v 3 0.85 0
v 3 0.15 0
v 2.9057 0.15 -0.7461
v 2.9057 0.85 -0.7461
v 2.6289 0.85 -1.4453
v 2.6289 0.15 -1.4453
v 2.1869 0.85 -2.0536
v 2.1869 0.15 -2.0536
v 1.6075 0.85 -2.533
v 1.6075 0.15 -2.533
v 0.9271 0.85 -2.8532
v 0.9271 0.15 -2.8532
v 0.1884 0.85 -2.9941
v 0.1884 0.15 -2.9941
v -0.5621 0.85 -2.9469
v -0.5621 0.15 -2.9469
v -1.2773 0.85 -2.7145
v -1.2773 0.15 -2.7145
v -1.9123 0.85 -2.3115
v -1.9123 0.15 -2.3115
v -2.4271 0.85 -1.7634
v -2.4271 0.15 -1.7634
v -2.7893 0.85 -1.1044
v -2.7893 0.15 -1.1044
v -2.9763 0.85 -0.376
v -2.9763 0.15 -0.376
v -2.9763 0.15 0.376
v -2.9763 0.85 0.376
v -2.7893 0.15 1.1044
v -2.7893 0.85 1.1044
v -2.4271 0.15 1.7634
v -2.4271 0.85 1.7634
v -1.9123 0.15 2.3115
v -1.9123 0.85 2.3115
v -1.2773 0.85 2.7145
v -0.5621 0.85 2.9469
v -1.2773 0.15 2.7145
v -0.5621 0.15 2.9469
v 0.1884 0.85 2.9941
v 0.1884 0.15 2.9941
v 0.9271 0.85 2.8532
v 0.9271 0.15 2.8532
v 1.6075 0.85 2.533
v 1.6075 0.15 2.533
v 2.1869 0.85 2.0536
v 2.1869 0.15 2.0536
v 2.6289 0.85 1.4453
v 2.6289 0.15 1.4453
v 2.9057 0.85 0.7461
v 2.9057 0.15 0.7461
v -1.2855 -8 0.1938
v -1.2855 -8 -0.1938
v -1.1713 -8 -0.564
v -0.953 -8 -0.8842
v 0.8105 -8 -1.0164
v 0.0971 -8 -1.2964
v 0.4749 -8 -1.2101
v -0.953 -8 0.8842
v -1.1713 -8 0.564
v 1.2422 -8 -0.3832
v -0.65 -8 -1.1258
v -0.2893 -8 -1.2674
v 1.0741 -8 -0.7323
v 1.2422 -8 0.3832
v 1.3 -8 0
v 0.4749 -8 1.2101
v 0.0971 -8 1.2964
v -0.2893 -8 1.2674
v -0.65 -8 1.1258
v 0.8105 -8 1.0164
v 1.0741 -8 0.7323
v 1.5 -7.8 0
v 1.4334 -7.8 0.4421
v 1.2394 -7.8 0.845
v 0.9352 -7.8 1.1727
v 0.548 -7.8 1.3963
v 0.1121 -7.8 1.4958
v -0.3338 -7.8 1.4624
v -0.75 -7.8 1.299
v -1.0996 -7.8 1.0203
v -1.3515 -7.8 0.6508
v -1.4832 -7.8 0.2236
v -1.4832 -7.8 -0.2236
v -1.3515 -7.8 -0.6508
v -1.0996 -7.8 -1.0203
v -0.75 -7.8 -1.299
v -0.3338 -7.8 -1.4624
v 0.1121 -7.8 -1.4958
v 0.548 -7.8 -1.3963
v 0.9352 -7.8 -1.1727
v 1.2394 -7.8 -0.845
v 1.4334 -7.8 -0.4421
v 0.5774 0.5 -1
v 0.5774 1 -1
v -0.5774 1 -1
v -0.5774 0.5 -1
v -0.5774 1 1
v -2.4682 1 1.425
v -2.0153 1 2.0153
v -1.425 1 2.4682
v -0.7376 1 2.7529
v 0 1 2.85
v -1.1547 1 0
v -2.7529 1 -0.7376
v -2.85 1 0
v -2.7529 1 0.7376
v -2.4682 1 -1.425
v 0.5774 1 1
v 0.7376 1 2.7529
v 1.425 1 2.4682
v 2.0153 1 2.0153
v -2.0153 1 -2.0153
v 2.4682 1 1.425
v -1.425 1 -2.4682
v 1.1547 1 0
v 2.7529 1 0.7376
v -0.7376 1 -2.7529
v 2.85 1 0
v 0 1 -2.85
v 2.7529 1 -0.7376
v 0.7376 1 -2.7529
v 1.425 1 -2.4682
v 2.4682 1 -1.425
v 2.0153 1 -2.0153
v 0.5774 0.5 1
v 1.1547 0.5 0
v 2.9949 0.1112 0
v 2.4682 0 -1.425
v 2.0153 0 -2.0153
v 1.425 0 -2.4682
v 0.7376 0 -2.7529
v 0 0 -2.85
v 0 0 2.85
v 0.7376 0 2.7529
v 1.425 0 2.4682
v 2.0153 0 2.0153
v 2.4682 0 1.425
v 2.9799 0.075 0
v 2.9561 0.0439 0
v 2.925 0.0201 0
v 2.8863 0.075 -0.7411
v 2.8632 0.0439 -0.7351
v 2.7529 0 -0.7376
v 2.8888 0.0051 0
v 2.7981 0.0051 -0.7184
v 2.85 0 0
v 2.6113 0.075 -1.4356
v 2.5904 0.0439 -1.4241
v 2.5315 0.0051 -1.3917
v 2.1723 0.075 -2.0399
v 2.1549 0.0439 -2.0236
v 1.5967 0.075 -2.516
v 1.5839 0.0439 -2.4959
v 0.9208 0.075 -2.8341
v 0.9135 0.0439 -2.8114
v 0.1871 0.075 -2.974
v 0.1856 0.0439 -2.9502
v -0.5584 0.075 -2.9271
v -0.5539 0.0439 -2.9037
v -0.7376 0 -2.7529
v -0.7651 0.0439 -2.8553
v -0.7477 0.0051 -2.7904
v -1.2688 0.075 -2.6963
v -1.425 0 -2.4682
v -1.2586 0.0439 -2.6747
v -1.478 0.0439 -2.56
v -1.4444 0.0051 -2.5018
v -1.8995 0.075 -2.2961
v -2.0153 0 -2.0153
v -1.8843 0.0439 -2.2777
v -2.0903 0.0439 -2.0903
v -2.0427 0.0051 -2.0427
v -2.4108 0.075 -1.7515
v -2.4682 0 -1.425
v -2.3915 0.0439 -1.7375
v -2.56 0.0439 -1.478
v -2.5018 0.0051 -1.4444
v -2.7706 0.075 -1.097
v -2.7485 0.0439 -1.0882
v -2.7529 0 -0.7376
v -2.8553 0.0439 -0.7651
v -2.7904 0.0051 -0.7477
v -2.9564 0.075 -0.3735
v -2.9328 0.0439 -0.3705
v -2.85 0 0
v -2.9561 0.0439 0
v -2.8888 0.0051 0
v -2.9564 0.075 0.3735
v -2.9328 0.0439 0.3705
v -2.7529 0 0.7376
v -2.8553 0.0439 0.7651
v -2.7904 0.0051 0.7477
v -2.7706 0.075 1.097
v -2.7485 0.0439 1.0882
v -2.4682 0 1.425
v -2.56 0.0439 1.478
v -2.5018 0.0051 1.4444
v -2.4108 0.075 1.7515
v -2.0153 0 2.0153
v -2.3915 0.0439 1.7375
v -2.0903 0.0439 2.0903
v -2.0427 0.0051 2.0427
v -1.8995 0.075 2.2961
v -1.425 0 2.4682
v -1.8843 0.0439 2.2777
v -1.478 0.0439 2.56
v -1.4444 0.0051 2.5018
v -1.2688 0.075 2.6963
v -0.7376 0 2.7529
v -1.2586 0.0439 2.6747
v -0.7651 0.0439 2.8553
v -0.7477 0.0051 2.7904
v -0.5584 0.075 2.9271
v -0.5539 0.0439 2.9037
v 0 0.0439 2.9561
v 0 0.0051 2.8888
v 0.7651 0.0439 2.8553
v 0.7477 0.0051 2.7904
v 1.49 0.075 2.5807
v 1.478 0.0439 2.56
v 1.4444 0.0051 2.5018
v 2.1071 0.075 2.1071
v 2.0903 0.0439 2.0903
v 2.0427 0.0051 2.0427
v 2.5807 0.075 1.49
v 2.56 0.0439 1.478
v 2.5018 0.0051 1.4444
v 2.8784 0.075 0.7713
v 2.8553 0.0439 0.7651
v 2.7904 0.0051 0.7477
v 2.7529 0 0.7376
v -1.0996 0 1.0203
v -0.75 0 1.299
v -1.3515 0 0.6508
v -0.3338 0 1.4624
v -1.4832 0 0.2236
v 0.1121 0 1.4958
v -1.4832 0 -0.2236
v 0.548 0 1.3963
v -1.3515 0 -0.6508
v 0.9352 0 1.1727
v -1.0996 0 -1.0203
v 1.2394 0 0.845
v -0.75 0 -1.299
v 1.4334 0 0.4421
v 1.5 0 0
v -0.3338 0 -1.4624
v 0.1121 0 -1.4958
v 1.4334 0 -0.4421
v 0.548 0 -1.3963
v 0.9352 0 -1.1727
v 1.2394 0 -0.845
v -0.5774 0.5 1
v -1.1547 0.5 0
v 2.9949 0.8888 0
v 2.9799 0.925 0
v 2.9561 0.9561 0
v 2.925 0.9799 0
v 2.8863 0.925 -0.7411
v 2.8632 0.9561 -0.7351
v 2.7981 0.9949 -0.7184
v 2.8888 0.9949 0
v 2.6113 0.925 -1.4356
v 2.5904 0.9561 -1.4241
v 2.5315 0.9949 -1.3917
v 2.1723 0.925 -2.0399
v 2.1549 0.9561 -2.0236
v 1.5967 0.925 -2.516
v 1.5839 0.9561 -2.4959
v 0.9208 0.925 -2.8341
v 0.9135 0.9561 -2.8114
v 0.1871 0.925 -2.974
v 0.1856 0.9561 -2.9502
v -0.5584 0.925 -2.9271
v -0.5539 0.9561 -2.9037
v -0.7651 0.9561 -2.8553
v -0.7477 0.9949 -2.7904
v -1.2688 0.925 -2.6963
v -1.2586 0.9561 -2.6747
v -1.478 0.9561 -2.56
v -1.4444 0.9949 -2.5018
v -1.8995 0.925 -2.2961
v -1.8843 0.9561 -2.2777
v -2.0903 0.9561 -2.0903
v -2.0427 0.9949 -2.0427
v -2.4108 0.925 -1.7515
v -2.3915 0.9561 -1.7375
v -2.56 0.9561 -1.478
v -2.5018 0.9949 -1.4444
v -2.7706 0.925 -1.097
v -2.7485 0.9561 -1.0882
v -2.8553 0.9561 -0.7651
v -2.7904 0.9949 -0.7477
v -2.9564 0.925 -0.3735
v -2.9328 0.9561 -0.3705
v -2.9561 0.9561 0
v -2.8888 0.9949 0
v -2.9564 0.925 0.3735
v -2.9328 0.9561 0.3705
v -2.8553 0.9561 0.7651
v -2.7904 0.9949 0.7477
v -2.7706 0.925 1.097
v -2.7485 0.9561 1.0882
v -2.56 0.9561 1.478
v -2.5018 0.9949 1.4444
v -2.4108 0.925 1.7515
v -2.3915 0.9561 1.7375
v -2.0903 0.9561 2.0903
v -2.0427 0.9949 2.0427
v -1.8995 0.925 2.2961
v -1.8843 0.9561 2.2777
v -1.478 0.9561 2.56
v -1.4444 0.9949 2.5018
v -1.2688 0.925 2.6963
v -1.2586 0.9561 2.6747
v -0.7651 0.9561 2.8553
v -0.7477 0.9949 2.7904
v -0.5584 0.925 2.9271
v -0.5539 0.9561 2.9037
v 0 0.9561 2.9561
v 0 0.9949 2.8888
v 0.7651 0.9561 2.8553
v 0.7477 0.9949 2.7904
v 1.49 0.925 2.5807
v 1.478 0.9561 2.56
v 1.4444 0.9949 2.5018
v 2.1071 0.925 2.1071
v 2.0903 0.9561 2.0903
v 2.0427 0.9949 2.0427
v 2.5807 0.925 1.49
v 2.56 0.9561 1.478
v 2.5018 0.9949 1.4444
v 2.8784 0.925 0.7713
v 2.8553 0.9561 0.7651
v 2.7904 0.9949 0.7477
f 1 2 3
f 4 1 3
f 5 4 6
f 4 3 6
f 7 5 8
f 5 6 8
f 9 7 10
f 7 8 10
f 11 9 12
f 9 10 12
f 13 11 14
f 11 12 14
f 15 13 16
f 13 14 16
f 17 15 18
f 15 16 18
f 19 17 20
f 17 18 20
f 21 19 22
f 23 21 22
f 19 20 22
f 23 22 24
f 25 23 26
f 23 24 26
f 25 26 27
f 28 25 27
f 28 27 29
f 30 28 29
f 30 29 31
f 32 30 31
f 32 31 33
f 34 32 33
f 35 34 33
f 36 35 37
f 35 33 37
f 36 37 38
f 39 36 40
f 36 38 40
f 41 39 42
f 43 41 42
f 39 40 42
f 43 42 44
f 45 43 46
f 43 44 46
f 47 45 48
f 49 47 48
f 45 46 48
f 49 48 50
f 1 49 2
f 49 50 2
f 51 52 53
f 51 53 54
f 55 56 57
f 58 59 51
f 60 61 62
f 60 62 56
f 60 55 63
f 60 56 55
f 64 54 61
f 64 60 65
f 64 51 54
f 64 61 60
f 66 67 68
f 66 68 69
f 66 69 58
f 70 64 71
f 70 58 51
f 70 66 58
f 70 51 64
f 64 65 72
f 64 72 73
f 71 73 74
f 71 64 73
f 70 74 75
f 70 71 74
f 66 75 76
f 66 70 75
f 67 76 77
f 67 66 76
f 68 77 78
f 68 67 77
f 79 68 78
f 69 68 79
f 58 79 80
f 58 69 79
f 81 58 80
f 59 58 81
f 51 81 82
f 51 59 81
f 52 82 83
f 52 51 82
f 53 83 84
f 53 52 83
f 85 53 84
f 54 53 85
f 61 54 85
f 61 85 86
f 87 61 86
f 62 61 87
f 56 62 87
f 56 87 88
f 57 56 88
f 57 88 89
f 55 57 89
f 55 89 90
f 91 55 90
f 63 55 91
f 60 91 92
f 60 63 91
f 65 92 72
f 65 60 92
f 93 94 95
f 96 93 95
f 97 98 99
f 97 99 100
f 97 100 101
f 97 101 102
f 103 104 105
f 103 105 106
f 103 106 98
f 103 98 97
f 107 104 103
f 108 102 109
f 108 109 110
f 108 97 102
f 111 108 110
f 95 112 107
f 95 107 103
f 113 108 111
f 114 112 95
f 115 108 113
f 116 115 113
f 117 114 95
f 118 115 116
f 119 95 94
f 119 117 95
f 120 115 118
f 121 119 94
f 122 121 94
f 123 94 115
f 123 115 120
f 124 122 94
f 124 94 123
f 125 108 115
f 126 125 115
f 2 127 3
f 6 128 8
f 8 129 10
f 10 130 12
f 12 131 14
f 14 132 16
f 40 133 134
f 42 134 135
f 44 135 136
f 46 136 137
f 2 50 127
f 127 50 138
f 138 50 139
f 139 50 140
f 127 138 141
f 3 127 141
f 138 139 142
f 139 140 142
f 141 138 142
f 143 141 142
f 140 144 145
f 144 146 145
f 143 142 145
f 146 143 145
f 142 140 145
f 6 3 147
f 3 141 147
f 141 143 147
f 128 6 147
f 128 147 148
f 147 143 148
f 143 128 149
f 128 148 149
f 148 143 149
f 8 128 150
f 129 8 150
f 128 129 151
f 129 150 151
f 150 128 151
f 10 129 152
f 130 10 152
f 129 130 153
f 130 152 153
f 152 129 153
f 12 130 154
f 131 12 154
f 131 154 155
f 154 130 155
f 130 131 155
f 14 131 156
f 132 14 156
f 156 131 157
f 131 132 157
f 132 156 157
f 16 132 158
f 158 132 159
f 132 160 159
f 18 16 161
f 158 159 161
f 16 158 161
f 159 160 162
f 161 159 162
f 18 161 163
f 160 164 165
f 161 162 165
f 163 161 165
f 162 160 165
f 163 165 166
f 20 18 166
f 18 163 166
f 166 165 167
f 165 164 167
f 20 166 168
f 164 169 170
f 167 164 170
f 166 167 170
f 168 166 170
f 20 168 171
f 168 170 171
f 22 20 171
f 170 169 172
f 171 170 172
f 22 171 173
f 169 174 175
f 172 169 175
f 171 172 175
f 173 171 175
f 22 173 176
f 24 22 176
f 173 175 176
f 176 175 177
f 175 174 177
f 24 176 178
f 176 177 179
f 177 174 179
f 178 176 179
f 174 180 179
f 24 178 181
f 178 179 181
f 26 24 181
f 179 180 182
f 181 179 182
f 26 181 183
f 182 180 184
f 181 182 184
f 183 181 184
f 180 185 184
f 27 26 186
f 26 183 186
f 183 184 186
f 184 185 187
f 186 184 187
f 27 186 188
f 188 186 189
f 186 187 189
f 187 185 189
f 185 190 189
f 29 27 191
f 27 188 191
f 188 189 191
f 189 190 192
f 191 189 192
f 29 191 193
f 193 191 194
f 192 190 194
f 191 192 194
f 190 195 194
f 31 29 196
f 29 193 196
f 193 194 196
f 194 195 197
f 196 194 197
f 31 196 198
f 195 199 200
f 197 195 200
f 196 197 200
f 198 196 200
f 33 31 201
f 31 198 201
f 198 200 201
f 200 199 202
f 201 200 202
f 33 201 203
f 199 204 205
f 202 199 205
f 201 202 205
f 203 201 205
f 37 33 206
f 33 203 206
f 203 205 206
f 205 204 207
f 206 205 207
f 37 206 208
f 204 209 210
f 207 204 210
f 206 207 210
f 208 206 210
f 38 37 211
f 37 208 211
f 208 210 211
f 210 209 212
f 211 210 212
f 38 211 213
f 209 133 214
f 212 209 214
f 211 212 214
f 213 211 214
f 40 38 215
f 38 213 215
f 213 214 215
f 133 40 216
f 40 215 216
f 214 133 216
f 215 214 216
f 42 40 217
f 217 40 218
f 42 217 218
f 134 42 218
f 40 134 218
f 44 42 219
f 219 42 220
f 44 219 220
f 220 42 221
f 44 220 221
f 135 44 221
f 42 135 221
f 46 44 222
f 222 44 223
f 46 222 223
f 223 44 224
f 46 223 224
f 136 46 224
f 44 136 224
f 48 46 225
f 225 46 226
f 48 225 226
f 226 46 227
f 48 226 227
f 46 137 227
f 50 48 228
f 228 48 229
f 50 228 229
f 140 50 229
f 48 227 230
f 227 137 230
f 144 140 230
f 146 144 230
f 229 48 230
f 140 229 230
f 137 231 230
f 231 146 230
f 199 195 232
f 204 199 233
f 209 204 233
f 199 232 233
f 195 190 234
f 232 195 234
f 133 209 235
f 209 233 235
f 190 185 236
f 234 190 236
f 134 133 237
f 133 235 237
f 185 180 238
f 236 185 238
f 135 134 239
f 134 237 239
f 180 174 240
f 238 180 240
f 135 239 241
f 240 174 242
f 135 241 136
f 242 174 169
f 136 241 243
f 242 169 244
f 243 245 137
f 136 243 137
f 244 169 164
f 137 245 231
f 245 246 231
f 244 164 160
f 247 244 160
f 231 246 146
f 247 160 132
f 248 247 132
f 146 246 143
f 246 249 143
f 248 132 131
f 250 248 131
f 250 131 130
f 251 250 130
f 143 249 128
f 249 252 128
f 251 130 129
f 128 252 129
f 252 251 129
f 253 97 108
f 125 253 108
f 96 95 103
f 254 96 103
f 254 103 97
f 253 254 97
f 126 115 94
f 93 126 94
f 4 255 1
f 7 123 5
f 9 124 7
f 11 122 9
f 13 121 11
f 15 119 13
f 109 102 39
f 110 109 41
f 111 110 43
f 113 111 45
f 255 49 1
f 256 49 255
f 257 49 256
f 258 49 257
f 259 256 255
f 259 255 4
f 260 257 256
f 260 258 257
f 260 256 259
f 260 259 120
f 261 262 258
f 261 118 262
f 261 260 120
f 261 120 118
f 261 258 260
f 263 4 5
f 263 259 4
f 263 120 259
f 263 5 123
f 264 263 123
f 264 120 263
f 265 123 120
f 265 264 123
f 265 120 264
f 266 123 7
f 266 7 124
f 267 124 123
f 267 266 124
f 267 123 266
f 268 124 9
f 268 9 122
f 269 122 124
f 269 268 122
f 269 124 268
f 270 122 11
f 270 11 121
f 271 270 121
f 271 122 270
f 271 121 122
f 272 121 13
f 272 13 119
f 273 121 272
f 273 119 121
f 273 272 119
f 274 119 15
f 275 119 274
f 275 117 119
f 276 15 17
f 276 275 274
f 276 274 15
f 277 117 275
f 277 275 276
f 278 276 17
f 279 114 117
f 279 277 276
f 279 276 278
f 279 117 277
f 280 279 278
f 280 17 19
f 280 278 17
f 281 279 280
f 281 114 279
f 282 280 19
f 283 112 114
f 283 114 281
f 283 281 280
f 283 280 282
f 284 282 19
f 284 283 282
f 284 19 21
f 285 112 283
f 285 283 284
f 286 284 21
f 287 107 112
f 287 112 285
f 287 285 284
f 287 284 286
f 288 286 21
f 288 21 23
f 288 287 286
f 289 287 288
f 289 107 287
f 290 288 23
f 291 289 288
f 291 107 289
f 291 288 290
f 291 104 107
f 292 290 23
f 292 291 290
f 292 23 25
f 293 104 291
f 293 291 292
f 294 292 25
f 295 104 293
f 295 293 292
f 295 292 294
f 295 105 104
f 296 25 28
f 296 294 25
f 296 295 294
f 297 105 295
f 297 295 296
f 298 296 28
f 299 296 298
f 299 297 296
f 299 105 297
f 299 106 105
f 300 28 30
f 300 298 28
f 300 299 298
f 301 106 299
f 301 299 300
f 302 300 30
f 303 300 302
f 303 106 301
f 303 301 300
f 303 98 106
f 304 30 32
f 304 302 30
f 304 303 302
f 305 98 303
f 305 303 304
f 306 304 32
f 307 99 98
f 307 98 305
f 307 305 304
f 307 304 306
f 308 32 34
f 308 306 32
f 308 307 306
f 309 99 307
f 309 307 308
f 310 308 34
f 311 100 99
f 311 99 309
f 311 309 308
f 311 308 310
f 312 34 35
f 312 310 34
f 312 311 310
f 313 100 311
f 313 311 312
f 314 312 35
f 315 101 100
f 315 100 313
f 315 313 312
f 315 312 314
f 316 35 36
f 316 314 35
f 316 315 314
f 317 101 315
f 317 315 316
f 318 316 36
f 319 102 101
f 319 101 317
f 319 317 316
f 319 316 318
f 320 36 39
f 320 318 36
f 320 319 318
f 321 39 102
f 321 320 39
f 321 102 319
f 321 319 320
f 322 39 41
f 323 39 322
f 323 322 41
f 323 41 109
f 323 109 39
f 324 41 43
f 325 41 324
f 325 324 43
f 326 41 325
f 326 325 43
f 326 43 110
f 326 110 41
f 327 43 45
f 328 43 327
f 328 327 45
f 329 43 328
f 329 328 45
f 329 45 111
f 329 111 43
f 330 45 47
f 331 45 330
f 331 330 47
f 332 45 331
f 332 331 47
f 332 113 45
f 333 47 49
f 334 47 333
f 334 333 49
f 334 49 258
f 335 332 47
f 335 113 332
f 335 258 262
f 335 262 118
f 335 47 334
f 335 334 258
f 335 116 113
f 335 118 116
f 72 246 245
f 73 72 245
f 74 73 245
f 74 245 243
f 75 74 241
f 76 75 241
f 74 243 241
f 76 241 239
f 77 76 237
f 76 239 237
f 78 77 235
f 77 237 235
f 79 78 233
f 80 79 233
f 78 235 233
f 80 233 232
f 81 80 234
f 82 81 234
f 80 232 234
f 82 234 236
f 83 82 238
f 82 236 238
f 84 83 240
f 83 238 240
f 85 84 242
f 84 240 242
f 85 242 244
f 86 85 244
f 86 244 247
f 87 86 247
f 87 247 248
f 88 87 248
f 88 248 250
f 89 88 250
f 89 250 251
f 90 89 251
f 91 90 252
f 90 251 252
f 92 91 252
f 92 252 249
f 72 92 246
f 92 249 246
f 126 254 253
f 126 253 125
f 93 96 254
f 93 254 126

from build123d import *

# Parameters (mm, degrees)
SKETCH_1_R          = 3
EXTRUDE_1_DEPTH     = 1
SKETCH_2_R          = 1.5
EXTRUDE_2_DEPTH     = 8
FILLET_1_R          = 0.15
CHAMFER_1_SIZE      = 0.2
CUT_EXTRUDE_1_DEPTH = 0.5


with BuildPart() as part:
    # 草图1 → 凸台-拉伸1 (new body)
    with BuildSketch(Plane(origin=(0, 0, 0), x_dir=(1, 0, 0), z_dir=(0, 1, 0))):
        Circle(SKETCH_1_R)
    extrude(amount=EXTRUDE_1_DEPTH)

    # 草图2 → 凸台-拉伸2 (add)
    with BuildSketch(Plane.XZ):
        Circle(SKETCH_2_R)
    extrude(amount=EXTRUDE_2_DEPTH)

    # 圆角1
    fillet_1_edges = [part.edges().sort_by_distance(p)[0] for p in [
        (-3, 0, 0),
        (-3, 1, 0),
    ]]
    fillet(fillet_1_edges, radius=FILLET_1_R)

    # 倒角1
    chamfer_1_edges = [part.edges().sort_by_distance(p)[0] for p in [
        (-1.5, -8, 0),
    ]]
    chamfer(chamfer_1_edges, length=CHAMFER_1_SIZE)

    # 草图3 → 切除-拉伸1 (cut)
    with BuildSketch(Plane(origin=(0, 1, 0), x_dir=(1, 0, 0), z_dir=(0, 1, 0))):
        Polygon((1.154700538, 0), (0.577350269, 1), (-0.577350269, 1), (-1.154700538, 0), (-0.577350269, -1), (0.577350269, -1), align=None)
    extrude(amount=-CUT_EXTRUDE_1_DEPTH, mode=Mode.SUBTRACT)


solid = part.part
